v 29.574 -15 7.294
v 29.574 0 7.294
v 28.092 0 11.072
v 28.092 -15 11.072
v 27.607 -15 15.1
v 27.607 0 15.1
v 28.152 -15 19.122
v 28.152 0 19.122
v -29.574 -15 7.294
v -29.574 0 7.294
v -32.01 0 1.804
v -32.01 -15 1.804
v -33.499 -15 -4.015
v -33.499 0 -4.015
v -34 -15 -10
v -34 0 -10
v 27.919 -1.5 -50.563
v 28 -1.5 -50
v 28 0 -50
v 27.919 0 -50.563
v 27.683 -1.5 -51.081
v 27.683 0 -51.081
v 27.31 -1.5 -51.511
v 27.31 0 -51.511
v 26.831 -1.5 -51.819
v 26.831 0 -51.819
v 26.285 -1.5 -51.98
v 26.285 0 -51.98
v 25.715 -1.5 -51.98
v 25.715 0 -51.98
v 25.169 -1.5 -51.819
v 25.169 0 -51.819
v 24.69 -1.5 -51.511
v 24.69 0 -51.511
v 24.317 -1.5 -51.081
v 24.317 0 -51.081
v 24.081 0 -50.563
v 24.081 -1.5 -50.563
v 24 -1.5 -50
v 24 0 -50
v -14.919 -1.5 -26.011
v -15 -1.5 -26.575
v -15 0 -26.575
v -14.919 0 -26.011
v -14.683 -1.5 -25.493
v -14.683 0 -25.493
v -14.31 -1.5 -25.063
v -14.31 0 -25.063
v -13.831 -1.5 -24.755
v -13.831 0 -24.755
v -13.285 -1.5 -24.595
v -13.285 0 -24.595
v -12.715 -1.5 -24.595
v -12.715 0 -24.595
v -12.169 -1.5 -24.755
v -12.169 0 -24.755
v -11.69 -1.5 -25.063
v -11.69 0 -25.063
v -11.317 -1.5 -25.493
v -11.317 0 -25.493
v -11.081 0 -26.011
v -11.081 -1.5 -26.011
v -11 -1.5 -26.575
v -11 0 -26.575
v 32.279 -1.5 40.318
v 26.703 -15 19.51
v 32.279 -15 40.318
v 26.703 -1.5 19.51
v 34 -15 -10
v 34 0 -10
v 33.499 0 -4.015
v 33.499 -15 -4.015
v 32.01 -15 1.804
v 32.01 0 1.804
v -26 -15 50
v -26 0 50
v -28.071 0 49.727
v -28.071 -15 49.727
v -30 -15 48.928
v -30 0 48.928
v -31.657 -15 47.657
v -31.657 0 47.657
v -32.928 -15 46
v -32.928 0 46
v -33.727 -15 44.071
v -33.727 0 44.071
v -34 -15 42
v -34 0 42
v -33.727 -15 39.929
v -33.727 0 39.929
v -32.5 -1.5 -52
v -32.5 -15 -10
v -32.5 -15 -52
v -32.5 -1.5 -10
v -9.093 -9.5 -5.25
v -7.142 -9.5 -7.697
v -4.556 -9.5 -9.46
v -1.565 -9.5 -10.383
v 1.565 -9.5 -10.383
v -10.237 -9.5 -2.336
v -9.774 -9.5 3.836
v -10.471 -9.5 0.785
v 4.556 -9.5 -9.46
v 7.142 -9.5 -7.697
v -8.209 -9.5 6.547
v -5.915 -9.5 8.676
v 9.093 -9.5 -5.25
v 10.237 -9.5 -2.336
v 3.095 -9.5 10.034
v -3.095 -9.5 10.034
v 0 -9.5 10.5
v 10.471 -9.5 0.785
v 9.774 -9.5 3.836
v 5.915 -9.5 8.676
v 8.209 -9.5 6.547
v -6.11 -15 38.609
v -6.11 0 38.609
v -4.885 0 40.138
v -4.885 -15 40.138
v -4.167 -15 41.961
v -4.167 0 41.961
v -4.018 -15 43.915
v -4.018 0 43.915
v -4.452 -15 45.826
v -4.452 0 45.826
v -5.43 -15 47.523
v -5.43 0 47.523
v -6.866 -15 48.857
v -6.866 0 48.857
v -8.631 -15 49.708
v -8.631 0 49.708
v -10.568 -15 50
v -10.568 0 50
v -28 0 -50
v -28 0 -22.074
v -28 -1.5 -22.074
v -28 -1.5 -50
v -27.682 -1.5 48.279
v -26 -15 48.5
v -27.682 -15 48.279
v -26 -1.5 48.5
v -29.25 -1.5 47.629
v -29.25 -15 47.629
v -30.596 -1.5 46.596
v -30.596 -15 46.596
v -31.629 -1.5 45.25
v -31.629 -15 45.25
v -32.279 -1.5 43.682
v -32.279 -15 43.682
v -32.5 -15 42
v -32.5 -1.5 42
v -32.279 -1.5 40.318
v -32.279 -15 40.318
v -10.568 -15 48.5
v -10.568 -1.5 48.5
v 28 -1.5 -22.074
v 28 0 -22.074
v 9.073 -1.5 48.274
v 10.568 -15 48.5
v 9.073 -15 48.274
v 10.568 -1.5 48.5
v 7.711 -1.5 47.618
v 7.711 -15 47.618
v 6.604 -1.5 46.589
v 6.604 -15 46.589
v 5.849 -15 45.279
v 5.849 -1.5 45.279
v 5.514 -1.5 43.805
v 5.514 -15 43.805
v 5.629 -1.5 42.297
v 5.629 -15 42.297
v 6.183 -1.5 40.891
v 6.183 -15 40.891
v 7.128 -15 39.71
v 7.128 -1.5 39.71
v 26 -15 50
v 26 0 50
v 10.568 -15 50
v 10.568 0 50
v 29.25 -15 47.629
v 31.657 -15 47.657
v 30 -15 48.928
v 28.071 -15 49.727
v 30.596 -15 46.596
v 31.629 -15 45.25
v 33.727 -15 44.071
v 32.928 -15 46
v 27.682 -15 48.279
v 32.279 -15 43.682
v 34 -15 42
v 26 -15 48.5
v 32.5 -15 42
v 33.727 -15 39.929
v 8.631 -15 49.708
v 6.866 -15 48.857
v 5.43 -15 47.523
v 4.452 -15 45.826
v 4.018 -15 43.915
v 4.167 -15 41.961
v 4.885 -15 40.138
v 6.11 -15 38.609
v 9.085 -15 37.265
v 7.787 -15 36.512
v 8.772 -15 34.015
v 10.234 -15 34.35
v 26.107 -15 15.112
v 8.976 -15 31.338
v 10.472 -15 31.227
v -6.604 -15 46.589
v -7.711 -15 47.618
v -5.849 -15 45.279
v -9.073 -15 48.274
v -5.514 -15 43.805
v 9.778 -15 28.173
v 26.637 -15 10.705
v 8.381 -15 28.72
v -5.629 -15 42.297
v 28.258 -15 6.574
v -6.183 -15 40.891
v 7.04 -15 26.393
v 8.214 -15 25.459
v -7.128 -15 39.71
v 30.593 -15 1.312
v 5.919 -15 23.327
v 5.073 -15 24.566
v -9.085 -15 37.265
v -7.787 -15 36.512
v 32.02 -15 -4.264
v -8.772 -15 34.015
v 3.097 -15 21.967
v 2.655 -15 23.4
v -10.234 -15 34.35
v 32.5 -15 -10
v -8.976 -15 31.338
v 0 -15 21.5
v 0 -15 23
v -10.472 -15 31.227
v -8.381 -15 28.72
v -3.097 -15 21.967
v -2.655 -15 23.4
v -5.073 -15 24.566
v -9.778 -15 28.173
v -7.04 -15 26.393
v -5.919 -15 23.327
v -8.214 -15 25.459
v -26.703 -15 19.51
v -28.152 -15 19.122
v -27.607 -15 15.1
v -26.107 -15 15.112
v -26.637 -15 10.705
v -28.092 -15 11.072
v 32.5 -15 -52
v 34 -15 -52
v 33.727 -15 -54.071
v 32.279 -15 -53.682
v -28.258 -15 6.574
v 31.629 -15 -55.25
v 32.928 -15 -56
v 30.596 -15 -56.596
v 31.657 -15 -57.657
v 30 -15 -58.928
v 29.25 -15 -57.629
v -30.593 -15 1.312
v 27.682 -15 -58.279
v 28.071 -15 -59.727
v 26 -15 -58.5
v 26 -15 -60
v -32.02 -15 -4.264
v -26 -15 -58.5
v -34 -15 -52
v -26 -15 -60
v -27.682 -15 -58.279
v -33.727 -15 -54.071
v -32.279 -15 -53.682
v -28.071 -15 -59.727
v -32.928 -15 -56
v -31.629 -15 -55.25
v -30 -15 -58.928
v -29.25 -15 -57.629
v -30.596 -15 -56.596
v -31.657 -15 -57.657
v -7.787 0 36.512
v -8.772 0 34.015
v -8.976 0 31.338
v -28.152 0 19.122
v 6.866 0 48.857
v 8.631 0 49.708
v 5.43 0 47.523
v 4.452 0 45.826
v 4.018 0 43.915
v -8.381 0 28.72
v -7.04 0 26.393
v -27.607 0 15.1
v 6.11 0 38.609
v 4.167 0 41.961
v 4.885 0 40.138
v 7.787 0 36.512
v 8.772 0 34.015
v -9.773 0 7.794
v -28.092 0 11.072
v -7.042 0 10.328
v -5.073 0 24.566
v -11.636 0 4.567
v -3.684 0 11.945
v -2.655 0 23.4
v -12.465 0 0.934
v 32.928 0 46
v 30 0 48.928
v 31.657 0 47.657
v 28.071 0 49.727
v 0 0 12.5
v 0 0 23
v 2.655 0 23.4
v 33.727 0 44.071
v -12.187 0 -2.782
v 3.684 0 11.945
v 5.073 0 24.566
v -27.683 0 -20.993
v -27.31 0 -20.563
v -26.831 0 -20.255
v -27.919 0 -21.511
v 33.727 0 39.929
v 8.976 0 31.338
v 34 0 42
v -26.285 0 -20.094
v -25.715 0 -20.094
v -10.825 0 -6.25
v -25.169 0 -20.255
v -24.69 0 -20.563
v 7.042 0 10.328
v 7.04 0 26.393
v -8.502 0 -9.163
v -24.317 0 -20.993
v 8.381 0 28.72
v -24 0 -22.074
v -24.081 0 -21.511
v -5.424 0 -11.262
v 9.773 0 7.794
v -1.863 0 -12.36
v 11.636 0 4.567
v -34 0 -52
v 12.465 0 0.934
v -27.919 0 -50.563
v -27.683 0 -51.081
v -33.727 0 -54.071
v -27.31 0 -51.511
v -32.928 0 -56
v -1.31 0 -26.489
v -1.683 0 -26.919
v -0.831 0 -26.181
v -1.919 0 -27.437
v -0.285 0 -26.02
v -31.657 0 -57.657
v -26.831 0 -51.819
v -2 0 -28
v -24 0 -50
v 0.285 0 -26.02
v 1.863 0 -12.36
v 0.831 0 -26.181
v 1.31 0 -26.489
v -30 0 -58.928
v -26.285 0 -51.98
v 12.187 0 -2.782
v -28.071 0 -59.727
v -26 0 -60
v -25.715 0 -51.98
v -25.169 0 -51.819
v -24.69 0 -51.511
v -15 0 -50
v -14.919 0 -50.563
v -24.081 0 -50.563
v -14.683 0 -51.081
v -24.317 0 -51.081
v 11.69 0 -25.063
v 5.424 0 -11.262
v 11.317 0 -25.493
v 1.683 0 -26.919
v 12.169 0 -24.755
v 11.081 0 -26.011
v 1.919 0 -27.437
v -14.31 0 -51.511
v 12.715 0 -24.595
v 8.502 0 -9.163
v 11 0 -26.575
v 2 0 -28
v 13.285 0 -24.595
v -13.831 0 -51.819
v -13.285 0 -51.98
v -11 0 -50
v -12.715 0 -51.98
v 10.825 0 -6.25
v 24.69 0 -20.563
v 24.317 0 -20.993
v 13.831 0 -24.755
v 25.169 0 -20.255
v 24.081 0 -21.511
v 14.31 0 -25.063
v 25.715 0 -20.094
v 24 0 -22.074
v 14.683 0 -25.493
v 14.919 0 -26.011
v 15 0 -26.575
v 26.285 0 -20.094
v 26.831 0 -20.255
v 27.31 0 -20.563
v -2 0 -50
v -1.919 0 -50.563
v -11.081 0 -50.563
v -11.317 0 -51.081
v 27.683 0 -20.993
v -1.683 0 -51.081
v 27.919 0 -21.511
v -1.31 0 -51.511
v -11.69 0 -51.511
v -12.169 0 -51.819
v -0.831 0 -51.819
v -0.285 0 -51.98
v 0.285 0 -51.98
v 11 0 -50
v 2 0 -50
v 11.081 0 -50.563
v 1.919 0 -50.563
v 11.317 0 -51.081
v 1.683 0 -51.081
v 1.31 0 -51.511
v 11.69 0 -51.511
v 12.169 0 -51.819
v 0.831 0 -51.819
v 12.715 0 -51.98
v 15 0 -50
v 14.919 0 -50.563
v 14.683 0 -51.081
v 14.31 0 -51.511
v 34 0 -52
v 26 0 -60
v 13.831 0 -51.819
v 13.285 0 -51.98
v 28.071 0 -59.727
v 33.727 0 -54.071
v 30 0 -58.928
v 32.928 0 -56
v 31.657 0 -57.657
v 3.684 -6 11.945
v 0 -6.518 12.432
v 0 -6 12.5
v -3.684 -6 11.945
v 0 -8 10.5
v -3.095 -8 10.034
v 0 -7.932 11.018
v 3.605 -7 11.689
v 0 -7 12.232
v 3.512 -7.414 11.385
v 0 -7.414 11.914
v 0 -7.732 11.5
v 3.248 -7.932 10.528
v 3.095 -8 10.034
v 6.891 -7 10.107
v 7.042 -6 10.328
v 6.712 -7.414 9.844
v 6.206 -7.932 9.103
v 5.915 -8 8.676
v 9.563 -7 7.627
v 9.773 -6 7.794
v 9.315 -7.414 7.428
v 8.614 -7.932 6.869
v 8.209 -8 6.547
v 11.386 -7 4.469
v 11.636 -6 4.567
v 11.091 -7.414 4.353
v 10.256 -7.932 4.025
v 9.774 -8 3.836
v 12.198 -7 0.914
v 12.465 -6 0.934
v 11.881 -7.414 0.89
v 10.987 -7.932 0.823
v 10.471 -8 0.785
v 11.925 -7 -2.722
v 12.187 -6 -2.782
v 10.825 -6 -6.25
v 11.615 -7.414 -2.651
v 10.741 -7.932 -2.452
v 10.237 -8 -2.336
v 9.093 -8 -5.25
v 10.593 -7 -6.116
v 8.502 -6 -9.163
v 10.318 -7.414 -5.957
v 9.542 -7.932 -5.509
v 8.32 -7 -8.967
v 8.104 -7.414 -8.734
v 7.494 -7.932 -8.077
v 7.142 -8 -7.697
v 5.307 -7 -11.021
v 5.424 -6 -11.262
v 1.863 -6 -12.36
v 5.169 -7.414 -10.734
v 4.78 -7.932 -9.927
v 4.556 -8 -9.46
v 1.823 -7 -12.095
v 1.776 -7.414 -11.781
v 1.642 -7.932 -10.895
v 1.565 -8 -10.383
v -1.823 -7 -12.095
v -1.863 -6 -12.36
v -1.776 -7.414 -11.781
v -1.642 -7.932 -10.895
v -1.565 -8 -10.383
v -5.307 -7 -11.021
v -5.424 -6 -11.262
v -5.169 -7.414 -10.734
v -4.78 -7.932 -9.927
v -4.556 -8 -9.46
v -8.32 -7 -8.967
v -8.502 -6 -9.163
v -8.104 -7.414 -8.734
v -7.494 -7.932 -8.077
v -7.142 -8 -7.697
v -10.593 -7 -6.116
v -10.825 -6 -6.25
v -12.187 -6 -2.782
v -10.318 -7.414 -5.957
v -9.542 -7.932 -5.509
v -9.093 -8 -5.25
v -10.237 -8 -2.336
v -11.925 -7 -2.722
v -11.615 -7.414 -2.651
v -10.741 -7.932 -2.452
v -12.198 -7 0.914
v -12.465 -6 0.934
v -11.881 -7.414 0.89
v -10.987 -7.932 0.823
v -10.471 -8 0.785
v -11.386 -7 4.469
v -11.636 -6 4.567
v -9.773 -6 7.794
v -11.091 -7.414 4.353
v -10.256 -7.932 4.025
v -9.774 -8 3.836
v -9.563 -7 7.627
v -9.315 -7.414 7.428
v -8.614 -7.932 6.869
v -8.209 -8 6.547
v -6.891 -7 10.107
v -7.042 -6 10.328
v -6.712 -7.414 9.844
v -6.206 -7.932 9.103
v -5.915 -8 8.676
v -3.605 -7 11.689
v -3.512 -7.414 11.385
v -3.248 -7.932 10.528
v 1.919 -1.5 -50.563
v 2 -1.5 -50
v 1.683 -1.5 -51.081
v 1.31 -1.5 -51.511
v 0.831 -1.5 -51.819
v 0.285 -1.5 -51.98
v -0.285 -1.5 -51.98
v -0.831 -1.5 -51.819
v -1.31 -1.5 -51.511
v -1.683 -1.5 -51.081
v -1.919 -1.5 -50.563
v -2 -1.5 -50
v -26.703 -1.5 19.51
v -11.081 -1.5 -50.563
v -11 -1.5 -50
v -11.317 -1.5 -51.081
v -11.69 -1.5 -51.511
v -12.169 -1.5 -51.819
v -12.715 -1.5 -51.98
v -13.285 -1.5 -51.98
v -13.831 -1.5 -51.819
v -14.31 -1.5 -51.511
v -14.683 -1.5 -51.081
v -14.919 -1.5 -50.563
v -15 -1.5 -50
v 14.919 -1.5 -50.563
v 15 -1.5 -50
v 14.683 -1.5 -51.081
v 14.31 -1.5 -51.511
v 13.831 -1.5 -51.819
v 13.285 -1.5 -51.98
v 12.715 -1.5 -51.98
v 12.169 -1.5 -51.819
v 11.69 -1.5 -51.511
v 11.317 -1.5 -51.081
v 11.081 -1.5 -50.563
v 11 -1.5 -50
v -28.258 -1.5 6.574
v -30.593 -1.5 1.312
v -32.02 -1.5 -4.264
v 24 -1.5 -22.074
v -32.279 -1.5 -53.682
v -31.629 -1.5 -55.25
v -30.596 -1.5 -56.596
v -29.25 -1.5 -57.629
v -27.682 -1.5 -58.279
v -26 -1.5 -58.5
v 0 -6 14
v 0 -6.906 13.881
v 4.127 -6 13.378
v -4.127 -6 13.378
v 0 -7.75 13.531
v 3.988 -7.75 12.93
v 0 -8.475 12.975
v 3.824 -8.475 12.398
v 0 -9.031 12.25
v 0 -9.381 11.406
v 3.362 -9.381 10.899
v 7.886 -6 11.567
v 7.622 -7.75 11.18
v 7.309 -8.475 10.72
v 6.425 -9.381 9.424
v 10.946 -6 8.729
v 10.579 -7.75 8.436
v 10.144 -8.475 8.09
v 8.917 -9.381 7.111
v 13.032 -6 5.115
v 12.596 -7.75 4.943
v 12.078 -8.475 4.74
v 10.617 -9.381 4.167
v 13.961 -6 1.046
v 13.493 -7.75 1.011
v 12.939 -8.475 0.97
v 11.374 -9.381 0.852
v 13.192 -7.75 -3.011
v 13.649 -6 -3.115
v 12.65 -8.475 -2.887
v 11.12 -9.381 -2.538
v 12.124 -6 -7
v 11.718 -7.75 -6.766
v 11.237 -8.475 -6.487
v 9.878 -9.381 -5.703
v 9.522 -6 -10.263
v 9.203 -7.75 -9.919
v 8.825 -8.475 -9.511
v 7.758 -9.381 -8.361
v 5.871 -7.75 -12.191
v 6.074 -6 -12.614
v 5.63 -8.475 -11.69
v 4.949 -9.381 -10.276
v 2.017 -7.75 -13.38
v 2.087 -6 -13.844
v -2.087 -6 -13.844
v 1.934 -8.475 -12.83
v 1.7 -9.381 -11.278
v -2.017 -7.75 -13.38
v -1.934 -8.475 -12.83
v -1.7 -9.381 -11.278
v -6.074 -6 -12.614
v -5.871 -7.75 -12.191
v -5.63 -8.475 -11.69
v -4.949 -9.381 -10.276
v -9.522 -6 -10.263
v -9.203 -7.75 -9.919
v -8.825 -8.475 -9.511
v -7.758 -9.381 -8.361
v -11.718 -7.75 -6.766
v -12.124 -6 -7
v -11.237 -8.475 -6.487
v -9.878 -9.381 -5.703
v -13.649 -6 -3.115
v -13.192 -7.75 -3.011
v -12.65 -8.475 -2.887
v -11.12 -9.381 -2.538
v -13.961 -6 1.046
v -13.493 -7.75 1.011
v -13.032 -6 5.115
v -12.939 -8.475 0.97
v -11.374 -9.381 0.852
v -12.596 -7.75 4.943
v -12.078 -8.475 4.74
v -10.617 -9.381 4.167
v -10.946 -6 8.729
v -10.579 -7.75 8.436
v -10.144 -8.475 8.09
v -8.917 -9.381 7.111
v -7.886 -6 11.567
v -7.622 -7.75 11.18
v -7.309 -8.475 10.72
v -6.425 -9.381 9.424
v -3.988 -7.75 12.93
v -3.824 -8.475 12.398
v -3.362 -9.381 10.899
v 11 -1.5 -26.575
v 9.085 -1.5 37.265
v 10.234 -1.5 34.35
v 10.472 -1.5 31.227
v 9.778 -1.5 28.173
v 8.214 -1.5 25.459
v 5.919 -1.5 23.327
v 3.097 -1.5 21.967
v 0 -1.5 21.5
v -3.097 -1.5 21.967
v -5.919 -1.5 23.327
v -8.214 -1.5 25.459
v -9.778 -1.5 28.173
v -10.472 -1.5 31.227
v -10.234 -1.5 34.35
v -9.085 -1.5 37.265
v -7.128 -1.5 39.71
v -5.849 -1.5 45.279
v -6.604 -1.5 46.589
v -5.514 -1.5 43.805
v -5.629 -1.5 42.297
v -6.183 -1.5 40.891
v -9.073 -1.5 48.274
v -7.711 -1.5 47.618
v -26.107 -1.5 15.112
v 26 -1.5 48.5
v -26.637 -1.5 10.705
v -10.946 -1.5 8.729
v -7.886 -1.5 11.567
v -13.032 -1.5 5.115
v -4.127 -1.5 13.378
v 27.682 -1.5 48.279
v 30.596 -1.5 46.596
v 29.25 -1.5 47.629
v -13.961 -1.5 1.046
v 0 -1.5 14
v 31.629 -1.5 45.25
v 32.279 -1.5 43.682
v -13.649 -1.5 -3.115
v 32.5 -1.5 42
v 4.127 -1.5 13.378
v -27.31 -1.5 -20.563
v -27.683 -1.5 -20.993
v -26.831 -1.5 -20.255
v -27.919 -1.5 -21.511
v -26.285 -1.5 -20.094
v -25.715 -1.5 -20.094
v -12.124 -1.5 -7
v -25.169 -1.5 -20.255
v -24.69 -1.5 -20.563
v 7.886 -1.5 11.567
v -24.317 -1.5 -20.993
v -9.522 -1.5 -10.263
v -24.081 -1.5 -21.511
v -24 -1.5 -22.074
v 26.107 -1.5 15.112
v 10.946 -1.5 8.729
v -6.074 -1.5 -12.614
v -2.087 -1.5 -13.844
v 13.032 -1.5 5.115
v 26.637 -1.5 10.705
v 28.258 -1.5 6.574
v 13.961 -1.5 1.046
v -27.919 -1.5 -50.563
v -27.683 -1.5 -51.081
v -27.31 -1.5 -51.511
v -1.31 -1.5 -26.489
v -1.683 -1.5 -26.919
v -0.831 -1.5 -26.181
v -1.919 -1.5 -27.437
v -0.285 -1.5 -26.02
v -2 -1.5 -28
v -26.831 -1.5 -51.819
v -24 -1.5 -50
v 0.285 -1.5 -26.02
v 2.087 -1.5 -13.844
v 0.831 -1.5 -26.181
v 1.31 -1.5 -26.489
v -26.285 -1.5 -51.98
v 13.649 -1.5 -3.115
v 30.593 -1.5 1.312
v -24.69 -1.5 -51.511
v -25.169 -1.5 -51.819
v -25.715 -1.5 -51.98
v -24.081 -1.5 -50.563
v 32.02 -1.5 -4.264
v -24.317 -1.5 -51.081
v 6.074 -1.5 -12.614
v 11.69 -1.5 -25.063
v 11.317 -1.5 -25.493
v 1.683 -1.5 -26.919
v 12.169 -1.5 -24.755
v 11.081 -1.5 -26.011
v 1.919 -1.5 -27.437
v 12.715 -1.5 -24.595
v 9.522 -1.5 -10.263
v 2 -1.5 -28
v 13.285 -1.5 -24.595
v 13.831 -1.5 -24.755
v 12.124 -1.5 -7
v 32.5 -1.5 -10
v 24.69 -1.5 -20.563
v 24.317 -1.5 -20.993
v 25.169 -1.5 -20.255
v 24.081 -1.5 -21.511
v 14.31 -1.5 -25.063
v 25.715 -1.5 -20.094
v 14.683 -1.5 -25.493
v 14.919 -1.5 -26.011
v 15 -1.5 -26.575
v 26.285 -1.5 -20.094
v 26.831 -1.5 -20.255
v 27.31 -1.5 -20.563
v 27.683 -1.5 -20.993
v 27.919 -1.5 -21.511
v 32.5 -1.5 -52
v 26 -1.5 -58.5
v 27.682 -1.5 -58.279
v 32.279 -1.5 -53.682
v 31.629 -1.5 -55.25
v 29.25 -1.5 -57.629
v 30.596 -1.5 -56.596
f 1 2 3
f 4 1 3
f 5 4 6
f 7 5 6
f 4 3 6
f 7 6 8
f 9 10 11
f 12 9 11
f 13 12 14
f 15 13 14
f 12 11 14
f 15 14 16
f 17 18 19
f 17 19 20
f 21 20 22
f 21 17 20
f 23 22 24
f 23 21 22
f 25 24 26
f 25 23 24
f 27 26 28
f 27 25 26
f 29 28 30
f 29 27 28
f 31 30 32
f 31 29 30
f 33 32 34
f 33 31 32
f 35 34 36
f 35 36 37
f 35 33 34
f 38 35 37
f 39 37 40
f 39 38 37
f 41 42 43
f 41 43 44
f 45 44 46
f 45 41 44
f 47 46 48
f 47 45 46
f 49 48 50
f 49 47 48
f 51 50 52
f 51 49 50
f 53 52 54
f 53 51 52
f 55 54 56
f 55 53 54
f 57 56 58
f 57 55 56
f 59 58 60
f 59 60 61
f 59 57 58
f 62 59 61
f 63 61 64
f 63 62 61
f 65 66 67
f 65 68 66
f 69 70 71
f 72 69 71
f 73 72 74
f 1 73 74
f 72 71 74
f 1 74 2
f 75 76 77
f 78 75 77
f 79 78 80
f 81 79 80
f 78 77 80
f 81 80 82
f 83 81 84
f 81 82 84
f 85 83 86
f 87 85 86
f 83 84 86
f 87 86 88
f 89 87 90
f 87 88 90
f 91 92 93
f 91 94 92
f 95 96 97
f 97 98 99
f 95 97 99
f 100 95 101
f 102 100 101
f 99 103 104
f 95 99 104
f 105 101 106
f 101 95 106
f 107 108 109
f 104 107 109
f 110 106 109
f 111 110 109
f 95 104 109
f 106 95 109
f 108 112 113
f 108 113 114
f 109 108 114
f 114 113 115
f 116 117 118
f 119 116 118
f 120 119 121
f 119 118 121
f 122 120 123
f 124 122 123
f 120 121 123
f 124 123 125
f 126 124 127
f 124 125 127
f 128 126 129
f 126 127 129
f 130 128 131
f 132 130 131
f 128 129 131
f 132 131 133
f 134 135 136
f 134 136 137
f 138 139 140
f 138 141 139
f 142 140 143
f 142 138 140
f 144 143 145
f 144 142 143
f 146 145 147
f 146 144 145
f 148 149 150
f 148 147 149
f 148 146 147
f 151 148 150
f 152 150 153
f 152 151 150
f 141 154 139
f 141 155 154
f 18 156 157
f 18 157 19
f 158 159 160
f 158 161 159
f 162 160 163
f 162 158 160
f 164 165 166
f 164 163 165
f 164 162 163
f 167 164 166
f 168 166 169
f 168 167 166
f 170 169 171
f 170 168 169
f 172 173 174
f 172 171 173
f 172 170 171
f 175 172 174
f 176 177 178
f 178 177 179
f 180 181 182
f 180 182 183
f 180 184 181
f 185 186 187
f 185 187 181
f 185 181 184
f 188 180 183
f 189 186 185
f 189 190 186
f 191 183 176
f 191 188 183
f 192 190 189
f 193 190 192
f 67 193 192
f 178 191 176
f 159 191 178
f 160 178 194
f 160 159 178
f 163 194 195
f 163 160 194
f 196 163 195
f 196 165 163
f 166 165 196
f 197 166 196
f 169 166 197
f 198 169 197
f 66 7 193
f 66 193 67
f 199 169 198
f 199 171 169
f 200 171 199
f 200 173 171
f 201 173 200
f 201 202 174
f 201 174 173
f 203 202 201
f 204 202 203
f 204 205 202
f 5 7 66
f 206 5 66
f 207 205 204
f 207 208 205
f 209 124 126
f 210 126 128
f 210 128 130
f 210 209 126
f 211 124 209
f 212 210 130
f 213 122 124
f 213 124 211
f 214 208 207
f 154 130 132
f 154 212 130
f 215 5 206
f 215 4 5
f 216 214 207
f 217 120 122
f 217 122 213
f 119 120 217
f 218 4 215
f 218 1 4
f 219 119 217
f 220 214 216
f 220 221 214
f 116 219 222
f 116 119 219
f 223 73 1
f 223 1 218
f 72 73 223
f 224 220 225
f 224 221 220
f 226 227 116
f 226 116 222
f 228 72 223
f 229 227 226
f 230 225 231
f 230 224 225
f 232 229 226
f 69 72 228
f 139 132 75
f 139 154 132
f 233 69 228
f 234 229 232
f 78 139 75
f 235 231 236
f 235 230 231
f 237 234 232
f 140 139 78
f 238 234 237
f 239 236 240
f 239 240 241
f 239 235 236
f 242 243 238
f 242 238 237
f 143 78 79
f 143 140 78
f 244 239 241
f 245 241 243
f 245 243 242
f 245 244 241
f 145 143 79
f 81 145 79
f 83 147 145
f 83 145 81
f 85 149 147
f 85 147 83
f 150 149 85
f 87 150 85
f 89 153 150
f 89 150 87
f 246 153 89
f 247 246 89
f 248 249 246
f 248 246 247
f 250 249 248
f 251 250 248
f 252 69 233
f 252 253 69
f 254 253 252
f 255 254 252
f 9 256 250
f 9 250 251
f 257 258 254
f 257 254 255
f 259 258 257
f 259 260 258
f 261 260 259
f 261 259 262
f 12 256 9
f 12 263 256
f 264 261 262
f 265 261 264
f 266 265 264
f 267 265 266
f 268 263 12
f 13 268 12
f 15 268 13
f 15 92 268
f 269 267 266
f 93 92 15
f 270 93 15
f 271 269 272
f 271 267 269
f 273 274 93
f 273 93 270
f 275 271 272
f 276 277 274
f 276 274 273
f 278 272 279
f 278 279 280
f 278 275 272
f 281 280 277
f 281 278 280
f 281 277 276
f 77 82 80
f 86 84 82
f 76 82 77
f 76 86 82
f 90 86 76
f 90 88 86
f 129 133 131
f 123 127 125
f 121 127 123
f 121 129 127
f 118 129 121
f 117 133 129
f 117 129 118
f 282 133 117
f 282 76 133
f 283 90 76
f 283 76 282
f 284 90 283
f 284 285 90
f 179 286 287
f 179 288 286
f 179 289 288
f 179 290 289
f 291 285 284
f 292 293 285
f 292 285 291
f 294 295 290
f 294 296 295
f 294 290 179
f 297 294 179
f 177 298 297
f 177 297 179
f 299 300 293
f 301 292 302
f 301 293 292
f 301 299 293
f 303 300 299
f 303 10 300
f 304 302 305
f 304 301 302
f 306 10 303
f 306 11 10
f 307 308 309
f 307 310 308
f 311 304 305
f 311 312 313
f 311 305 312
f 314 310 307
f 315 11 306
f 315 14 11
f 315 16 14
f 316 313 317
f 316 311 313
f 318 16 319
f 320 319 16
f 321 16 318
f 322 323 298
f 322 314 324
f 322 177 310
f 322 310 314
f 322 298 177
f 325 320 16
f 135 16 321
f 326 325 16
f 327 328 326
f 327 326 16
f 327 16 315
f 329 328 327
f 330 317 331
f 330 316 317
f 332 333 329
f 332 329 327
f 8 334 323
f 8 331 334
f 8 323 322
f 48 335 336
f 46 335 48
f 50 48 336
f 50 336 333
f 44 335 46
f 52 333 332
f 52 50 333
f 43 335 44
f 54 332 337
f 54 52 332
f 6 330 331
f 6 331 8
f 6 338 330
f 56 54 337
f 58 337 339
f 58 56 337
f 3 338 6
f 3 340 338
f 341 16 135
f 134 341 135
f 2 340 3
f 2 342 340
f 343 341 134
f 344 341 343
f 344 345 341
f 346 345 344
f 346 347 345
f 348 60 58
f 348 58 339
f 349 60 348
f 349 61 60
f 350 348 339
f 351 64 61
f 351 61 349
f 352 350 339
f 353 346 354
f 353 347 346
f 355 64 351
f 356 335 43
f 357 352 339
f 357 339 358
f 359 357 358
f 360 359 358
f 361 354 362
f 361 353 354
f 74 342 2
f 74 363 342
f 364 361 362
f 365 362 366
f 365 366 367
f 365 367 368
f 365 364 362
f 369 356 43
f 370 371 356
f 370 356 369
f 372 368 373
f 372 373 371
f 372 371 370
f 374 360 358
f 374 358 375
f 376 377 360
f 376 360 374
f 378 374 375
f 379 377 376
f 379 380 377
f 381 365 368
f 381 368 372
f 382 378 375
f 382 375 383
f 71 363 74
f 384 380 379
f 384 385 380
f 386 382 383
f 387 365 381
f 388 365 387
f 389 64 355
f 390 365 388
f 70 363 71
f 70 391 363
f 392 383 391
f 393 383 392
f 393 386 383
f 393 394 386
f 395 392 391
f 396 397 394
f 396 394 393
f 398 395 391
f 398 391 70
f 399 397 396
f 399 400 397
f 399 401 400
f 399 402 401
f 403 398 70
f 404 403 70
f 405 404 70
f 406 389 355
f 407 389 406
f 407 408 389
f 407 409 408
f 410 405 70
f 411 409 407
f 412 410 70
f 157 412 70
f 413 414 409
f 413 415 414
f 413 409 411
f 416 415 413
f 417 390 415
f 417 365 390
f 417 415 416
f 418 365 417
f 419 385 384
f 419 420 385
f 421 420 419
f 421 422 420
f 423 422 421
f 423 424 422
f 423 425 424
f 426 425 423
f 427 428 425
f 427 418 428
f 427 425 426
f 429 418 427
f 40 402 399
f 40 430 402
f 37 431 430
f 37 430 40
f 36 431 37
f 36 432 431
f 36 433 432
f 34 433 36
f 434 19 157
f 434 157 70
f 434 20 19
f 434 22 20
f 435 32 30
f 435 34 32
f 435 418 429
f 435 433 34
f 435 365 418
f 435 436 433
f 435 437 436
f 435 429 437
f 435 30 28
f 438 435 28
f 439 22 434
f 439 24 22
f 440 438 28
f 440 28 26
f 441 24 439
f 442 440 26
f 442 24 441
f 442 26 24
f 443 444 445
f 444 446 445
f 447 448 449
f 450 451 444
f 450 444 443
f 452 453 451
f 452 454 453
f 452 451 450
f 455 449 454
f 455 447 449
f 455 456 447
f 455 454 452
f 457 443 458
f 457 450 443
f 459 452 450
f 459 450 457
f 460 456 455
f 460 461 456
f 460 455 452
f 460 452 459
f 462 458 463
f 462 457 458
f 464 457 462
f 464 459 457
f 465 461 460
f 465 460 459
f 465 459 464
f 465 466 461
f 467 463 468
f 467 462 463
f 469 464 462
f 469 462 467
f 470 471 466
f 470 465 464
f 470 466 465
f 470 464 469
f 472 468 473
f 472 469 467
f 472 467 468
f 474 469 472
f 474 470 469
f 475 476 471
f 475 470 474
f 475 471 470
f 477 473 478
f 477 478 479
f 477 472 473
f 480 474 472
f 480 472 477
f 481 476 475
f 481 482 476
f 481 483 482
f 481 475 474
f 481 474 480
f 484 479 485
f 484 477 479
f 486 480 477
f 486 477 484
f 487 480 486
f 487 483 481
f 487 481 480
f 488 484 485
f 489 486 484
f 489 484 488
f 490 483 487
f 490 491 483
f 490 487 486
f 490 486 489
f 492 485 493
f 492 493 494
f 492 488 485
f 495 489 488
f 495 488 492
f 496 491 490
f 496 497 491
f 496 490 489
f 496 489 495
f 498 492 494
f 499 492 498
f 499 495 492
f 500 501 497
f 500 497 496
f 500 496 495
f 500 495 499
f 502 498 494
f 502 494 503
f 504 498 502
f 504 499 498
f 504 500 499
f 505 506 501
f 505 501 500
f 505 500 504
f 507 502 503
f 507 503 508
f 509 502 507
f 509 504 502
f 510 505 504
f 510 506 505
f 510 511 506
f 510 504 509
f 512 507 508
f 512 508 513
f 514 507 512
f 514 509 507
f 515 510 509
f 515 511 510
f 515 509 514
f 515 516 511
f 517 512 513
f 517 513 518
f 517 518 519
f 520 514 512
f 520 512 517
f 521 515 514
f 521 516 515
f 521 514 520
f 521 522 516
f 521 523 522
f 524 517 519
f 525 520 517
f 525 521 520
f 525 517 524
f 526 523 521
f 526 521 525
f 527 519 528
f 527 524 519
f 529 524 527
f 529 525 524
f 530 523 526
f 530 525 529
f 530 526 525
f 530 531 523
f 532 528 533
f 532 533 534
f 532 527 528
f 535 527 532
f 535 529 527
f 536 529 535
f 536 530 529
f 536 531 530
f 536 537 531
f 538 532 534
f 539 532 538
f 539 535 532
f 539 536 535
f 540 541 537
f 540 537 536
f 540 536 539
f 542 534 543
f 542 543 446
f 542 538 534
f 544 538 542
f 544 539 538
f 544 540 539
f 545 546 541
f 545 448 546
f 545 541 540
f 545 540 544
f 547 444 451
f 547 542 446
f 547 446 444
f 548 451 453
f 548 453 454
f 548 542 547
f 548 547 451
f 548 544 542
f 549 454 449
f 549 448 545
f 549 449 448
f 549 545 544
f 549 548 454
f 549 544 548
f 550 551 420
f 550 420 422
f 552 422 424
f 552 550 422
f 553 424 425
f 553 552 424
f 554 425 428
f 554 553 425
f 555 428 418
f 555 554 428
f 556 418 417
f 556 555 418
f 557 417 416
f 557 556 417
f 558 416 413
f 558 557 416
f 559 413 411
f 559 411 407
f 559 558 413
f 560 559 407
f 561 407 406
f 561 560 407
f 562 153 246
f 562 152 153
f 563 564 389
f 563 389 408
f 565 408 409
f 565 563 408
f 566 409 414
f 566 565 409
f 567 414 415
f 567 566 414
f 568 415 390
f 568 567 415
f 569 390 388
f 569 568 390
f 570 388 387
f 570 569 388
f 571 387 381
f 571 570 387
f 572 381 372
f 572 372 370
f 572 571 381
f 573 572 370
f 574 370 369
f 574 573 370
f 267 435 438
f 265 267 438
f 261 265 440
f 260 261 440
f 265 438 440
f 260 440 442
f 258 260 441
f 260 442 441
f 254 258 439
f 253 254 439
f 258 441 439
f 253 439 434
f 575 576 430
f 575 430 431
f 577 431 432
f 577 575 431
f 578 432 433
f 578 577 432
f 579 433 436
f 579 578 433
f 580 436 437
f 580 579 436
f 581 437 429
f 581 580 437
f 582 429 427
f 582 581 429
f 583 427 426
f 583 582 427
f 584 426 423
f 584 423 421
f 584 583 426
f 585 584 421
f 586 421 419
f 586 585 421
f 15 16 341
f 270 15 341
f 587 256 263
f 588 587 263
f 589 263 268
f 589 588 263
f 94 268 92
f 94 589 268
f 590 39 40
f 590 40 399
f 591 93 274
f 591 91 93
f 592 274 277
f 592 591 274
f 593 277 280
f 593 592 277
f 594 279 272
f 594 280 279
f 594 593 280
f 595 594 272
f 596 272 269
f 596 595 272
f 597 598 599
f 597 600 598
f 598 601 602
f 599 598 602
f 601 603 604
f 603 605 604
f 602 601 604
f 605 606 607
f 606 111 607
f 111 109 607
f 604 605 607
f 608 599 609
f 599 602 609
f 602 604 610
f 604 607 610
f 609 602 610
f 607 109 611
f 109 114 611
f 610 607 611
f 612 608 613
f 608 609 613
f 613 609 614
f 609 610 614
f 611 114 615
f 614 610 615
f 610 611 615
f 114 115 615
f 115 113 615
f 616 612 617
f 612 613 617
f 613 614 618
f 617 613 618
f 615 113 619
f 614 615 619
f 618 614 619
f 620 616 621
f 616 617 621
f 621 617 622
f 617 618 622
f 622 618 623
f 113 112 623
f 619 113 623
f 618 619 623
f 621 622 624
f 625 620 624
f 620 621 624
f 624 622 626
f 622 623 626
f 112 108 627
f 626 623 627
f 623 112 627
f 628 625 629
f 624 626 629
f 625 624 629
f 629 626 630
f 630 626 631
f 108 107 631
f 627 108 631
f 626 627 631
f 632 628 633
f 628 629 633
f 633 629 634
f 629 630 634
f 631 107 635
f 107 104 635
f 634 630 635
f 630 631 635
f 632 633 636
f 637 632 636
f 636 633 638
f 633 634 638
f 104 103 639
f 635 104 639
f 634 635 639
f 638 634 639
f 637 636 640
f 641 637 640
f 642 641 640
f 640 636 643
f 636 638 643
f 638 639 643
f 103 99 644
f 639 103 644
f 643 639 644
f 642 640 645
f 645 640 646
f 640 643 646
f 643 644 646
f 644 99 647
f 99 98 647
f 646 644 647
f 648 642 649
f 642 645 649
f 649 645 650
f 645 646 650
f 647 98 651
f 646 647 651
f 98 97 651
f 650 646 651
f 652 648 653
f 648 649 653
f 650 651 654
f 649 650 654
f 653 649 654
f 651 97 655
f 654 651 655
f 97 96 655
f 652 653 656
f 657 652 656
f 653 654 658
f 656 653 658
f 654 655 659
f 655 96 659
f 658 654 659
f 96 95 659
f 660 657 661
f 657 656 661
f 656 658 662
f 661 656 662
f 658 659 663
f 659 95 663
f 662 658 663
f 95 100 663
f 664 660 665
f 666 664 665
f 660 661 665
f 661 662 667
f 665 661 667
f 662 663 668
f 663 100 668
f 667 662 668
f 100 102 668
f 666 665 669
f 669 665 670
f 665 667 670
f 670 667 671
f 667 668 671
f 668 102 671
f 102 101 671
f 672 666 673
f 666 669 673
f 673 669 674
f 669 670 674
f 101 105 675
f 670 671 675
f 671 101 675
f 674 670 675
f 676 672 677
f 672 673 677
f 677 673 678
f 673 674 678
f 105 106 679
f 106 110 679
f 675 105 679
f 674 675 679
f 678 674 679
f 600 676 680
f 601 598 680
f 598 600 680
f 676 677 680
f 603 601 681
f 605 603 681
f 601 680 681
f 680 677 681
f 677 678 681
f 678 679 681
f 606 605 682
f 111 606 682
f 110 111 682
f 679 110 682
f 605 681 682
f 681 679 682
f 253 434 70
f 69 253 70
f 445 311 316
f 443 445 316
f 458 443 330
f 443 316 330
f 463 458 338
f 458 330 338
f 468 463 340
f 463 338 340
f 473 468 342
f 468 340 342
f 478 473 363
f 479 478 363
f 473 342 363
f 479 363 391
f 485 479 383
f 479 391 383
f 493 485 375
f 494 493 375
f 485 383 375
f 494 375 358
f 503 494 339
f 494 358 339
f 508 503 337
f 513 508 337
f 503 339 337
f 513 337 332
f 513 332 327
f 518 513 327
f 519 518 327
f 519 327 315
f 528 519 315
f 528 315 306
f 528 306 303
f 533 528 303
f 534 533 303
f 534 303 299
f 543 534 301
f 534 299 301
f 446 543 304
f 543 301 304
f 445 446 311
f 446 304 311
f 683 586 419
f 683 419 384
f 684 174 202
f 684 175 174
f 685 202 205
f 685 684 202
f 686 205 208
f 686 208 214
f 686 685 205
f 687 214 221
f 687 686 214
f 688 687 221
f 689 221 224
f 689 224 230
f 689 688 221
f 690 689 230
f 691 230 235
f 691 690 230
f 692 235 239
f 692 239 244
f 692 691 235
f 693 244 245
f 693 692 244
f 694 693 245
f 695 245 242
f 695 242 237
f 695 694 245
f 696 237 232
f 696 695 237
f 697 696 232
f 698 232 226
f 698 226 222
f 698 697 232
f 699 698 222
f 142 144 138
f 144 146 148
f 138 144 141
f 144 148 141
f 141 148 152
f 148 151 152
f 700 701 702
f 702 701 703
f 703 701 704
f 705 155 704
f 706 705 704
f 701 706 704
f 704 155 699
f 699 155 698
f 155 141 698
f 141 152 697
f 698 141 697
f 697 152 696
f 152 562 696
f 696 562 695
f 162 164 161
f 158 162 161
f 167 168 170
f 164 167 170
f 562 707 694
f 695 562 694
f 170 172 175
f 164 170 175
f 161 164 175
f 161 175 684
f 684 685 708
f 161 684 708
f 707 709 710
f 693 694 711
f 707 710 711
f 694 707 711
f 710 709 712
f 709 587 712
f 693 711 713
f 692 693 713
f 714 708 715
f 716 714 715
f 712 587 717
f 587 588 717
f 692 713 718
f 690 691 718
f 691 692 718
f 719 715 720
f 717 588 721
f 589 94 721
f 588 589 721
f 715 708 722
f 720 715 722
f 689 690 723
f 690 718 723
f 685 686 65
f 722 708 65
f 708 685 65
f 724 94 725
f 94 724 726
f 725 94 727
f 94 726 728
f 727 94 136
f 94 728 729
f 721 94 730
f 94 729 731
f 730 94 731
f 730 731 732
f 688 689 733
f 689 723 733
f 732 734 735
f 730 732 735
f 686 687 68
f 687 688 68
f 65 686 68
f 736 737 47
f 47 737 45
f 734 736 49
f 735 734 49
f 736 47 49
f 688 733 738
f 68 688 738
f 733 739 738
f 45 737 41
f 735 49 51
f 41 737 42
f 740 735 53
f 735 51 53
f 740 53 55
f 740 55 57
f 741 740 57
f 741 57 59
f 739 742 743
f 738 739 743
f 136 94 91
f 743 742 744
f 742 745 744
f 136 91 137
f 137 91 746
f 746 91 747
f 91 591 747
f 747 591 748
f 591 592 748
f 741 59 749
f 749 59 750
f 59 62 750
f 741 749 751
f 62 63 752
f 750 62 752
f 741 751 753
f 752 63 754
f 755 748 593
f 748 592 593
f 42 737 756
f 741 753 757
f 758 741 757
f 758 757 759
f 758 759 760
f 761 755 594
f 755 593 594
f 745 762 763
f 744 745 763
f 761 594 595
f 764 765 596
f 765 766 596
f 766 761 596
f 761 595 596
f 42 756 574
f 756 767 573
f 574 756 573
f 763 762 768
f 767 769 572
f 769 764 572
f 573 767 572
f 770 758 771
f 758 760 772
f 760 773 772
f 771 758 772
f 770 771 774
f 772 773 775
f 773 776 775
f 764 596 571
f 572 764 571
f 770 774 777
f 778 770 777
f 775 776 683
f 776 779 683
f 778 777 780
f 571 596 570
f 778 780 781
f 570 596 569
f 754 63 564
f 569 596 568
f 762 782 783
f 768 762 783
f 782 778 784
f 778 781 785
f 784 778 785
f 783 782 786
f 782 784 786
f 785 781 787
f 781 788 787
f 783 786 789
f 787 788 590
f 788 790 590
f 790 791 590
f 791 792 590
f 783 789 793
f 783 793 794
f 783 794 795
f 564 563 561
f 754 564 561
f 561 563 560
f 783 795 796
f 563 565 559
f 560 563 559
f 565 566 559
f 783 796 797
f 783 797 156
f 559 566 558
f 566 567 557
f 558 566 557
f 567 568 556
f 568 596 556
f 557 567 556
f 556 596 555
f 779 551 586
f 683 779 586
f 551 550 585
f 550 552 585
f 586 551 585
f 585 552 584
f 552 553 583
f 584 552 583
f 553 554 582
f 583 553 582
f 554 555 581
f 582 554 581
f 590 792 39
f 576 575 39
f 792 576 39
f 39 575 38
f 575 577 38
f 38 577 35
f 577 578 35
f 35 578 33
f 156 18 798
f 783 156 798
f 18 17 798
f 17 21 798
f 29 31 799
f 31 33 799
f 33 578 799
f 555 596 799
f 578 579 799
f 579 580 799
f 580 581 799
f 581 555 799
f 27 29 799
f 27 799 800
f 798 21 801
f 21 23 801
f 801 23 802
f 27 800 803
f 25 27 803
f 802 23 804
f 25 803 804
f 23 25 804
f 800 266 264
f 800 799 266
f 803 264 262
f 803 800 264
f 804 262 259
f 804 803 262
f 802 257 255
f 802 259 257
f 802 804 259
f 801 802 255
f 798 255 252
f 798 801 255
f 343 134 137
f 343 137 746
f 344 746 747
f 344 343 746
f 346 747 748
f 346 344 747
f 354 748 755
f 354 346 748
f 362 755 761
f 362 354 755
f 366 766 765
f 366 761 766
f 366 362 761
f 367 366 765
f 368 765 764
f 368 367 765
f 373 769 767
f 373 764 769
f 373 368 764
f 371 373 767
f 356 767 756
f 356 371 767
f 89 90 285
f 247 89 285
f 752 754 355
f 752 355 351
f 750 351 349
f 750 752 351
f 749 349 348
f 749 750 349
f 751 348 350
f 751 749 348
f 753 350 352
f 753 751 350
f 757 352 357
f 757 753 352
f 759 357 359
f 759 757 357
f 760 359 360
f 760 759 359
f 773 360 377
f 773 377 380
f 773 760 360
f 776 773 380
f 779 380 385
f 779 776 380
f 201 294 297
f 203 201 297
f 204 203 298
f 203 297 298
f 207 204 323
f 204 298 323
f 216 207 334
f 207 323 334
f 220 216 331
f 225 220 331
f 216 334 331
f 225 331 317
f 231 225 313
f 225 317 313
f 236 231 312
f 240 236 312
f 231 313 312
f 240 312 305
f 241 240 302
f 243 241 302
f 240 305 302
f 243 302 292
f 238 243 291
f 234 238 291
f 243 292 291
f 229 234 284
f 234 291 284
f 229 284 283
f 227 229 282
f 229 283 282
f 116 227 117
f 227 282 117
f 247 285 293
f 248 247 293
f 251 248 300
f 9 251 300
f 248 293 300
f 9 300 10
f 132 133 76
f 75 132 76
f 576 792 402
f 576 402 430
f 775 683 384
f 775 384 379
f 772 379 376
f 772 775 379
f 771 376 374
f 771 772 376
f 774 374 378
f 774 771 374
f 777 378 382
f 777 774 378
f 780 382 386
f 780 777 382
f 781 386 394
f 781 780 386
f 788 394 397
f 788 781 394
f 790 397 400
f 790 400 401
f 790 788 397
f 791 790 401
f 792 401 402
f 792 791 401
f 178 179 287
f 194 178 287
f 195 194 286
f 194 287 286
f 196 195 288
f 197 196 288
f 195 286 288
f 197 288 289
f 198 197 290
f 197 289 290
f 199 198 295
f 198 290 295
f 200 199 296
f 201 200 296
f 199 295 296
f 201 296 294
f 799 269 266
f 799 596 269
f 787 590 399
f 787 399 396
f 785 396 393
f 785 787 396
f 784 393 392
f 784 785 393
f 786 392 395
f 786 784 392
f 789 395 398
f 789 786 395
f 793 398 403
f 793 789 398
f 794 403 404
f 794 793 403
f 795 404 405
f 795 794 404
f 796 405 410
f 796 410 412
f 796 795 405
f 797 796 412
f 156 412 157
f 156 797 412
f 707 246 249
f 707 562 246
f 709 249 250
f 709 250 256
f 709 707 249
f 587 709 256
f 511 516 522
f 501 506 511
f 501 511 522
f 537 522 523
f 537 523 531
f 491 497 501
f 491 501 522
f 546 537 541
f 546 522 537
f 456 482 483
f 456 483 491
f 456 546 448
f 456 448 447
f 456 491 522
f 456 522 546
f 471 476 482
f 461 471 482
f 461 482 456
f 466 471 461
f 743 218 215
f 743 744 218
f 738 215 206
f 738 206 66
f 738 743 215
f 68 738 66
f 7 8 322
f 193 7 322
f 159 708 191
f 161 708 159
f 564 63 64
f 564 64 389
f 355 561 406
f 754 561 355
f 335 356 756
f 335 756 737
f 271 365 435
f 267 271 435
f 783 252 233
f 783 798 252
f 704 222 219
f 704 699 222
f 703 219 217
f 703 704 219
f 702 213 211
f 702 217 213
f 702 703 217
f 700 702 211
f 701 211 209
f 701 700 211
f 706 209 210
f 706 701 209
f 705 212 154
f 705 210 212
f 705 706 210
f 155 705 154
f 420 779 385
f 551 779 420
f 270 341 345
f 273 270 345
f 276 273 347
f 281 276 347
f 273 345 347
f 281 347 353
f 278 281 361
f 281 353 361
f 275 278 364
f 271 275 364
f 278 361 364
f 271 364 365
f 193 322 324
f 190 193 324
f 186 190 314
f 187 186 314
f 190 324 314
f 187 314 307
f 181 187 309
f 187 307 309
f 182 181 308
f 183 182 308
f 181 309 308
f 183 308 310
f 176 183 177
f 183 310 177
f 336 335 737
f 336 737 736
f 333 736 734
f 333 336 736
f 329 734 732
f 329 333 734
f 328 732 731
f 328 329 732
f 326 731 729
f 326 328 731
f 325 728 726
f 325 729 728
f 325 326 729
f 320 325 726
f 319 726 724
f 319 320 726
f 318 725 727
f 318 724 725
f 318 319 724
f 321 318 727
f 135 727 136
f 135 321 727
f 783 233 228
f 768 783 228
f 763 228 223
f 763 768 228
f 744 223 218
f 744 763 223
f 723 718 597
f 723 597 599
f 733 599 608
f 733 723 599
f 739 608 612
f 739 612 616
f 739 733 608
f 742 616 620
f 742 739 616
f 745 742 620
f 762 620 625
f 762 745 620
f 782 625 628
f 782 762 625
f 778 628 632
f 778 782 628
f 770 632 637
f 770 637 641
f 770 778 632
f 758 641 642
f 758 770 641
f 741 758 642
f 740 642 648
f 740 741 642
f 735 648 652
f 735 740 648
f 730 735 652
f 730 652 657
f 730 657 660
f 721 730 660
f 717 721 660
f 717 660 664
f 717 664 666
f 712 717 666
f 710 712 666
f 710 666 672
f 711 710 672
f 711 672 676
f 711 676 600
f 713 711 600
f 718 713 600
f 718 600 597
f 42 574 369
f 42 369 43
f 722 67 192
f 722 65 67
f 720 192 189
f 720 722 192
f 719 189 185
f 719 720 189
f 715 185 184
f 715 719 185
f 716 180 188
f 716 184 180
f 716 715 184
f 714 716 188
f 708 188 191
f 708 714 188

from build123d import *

# Parameters (mm, degrees)
SKETCH_1_R             = 12.5
EXTRUDE_1_DEPTH        = 15
SKETCH_1_3_R           = 12.5
CUT_EXTRUDE_1_DEPTH    = 8
FILLET_1_R             = 2
SHELL_1_T              = -1.5
CUT_EXTRUDE_2_DEPTH    = 8
PATTERN_START          = -1.5
PATTERN_LINEAR_6_DEPTH = 1.5


# Read off the part's stored shape, not the designer's step: 阵列(线性)6
with BuildPart() as part:
    # 草图1 → 凸台-拉伸1 (new body)
    # profile 1 of 2: a face of its own
    with BuildSketch(Plane(origin=(0, 0, 0), x_dir=(1, 0, 0), z_dir=(0, 1, 0))):
        with BuildLine():
            ThreePointArc((6.109515315, -38.6086173), (0, -23), (-6.109515315, -38.6086173))
            ThreePointArc((-6.109515315, -38.6086173), (-4.451858441, -45.825779601), (-10.568323275, -50))
            Line((-10.568323275, -50), (-26, -50))
            ThreePointArc((-26, -50), (-32.346826722, -46.870091432), (-33.72740661, -39.929447639))
            Line((-33.72740661, -39.929447639), (-28.151949957, -19.121560132))
            ThreePointArc((-28.151949957, -19.121560132), (-27.721159204, -13.070589863), (-29.573912969, -7.294161438))
            ThreePointArc((-29.573912969, -7.294161438), (-32.875929141, 1.074218994), (-34, 10))
            Line((-34, 10), (-34, 52))
            ThreePointArc((-34, 52), (-31.656854249, 57.656854249), (-26, 60))
            Line((-26, 60), (26, 60))
            ThreePointArc((26, 60), (31.656854249, 57.656854249), (34, 52))
            Line((34, 52), (34, 10))
            ThreePointArc((34, 10), (32.875929141, 1.074218994), (29.573912969, -7.294161438))
            ThreePointArc((29.573912969, -7.294161438), (27.721159204, -13.070589863), (28.151949957, -19.121560132))
            Line((28.151949957, -19.121560132), (33.72740661, -39.929447639))
            ThreePointArc((33.72740661, -39.929447639), (32.346826722, -46.870091432), (26, -50))
            Line((26, -50), (10.568323275, -50))
            ThreePointArc((10.568323275, -50), (4.451858441, -45.825779601), (6.109515315, -38.6086173))
        make_face()
        Circle(SKETCH_1_R, mode=Mode.SUBTRACT)
    # profile 2 of 2: a face of its own
    with BuildSketch(Plane(origin=(0, 0, 0), x_dir=(1, 0, 0), z_dir=(0, 1, 0))):
        Circle(SKETCH_1_R)
    extrude(amount=-EXTRUDE_1_DEPTH)

    # 草图1<3> → 切除-拉伸1 (cut)
    with BuildSketch(Plane(origin=(0, 0, 0), x_dir=(1, 0, 0), z_dir=(0, 1, 0))):
        with Locations(Location((0, 0, 0), (0, 0, 270))):
            Circle(SKETCH_1_3_R)
    extrude(amount=-CUT_EXTRUDE_1_DEPTH, mode=Mode.SUBTRACT)

    # 圆角1
    fillet_1_edges = [part.edges().sort_by_distance(p)[0] for p in [
        (0, -8, -12.5),
    ]]
    fillet(fillet_1_edges, radius=FILLET_1_R)

    # 抽壳1
    shell_1_openings = [part.faces().sort_by_distance(p)[0] for p in [
        (0, -15, -8.148675604),
    ]]
    offset(amount=SHELL_1_T, openings=shell_1_openings, kind=Kind.INTERSECTION)

    # 草图2 → 切除-拉伸2 (cut)
    with BuildSketch(Plane(origin=(0, 0, 0), x_dir=(1, 0, 0), z_dir=(0, 1, 0))):
        with BuildLine():
            Line((-28, 22.074023338), (-28, 50))
            ThreePointArc((-28, 50), (-26, 52), (-24, 50))
            Line((-24, 50), (-24, 22.074023338))
            ThreePointArc((-24, 22.074023338), (-26, 20.074023338), (-28, 22.074023338))
        make_face()
    extrude(amount=-CUT_EXTRUDE_2_DEPTH, mode=Mode.SUBTRACT)

    # 阵列(线性)6 outline → 阵列(线性)6 (cut)
    with BuildSketch(Plane(origin=(0, 0, 0), x_dir=(1, 0, 0), z_dir=(0, 1, 0)).offset(PATTERN_START)):
        with BuildLine():
            Line((24, 50), (24, 22.074023338))
            ThreePointArc((24, 22.074023338), (26, 20.074023338), (28, 22.074023338))
            Line((28, 22.074023338), (28, 50))
            ThreePointArc((28, 50), (26, 52), (24, 50))
        make_face()
        with BuildLine():
            Line((11, 50), (11, 26.574738582))
            ThreePointArc((11, 26.574738582), (13, 24.574738582), (15, 26.574738582))
            Line((15, 26.574738582), (15, 50))
            ThreePointArc((15, 50), (13, 52), (11, 50))
        make_face()
        with BuildLine():
            Line((-2, 50), (-2, 28))
            ThreePointArc((-2, 28), (0, 26), (2, 28))
            Line((2, 28), (2, 50))
            ThreePointArc((2, 50), (0, 52), (-2, 50))
        make_face()
        with BuildLine():
            Line((-15, 50), (-15, 26.574738582))
            ThreePointArc((-15, 26.574738582), (-13, 24.574738582), (-11, 26.574738582))
            Line((-11, 26.574738582), (-11, 50))
            ThreePointArc((-11, 50), (-13, 52), (-15, 50))
        make_face()
    extrude(amount=PATTERN_LINEAR_6_DEPTH, mode=Mode.SUBTRACT)


solid = part.part
